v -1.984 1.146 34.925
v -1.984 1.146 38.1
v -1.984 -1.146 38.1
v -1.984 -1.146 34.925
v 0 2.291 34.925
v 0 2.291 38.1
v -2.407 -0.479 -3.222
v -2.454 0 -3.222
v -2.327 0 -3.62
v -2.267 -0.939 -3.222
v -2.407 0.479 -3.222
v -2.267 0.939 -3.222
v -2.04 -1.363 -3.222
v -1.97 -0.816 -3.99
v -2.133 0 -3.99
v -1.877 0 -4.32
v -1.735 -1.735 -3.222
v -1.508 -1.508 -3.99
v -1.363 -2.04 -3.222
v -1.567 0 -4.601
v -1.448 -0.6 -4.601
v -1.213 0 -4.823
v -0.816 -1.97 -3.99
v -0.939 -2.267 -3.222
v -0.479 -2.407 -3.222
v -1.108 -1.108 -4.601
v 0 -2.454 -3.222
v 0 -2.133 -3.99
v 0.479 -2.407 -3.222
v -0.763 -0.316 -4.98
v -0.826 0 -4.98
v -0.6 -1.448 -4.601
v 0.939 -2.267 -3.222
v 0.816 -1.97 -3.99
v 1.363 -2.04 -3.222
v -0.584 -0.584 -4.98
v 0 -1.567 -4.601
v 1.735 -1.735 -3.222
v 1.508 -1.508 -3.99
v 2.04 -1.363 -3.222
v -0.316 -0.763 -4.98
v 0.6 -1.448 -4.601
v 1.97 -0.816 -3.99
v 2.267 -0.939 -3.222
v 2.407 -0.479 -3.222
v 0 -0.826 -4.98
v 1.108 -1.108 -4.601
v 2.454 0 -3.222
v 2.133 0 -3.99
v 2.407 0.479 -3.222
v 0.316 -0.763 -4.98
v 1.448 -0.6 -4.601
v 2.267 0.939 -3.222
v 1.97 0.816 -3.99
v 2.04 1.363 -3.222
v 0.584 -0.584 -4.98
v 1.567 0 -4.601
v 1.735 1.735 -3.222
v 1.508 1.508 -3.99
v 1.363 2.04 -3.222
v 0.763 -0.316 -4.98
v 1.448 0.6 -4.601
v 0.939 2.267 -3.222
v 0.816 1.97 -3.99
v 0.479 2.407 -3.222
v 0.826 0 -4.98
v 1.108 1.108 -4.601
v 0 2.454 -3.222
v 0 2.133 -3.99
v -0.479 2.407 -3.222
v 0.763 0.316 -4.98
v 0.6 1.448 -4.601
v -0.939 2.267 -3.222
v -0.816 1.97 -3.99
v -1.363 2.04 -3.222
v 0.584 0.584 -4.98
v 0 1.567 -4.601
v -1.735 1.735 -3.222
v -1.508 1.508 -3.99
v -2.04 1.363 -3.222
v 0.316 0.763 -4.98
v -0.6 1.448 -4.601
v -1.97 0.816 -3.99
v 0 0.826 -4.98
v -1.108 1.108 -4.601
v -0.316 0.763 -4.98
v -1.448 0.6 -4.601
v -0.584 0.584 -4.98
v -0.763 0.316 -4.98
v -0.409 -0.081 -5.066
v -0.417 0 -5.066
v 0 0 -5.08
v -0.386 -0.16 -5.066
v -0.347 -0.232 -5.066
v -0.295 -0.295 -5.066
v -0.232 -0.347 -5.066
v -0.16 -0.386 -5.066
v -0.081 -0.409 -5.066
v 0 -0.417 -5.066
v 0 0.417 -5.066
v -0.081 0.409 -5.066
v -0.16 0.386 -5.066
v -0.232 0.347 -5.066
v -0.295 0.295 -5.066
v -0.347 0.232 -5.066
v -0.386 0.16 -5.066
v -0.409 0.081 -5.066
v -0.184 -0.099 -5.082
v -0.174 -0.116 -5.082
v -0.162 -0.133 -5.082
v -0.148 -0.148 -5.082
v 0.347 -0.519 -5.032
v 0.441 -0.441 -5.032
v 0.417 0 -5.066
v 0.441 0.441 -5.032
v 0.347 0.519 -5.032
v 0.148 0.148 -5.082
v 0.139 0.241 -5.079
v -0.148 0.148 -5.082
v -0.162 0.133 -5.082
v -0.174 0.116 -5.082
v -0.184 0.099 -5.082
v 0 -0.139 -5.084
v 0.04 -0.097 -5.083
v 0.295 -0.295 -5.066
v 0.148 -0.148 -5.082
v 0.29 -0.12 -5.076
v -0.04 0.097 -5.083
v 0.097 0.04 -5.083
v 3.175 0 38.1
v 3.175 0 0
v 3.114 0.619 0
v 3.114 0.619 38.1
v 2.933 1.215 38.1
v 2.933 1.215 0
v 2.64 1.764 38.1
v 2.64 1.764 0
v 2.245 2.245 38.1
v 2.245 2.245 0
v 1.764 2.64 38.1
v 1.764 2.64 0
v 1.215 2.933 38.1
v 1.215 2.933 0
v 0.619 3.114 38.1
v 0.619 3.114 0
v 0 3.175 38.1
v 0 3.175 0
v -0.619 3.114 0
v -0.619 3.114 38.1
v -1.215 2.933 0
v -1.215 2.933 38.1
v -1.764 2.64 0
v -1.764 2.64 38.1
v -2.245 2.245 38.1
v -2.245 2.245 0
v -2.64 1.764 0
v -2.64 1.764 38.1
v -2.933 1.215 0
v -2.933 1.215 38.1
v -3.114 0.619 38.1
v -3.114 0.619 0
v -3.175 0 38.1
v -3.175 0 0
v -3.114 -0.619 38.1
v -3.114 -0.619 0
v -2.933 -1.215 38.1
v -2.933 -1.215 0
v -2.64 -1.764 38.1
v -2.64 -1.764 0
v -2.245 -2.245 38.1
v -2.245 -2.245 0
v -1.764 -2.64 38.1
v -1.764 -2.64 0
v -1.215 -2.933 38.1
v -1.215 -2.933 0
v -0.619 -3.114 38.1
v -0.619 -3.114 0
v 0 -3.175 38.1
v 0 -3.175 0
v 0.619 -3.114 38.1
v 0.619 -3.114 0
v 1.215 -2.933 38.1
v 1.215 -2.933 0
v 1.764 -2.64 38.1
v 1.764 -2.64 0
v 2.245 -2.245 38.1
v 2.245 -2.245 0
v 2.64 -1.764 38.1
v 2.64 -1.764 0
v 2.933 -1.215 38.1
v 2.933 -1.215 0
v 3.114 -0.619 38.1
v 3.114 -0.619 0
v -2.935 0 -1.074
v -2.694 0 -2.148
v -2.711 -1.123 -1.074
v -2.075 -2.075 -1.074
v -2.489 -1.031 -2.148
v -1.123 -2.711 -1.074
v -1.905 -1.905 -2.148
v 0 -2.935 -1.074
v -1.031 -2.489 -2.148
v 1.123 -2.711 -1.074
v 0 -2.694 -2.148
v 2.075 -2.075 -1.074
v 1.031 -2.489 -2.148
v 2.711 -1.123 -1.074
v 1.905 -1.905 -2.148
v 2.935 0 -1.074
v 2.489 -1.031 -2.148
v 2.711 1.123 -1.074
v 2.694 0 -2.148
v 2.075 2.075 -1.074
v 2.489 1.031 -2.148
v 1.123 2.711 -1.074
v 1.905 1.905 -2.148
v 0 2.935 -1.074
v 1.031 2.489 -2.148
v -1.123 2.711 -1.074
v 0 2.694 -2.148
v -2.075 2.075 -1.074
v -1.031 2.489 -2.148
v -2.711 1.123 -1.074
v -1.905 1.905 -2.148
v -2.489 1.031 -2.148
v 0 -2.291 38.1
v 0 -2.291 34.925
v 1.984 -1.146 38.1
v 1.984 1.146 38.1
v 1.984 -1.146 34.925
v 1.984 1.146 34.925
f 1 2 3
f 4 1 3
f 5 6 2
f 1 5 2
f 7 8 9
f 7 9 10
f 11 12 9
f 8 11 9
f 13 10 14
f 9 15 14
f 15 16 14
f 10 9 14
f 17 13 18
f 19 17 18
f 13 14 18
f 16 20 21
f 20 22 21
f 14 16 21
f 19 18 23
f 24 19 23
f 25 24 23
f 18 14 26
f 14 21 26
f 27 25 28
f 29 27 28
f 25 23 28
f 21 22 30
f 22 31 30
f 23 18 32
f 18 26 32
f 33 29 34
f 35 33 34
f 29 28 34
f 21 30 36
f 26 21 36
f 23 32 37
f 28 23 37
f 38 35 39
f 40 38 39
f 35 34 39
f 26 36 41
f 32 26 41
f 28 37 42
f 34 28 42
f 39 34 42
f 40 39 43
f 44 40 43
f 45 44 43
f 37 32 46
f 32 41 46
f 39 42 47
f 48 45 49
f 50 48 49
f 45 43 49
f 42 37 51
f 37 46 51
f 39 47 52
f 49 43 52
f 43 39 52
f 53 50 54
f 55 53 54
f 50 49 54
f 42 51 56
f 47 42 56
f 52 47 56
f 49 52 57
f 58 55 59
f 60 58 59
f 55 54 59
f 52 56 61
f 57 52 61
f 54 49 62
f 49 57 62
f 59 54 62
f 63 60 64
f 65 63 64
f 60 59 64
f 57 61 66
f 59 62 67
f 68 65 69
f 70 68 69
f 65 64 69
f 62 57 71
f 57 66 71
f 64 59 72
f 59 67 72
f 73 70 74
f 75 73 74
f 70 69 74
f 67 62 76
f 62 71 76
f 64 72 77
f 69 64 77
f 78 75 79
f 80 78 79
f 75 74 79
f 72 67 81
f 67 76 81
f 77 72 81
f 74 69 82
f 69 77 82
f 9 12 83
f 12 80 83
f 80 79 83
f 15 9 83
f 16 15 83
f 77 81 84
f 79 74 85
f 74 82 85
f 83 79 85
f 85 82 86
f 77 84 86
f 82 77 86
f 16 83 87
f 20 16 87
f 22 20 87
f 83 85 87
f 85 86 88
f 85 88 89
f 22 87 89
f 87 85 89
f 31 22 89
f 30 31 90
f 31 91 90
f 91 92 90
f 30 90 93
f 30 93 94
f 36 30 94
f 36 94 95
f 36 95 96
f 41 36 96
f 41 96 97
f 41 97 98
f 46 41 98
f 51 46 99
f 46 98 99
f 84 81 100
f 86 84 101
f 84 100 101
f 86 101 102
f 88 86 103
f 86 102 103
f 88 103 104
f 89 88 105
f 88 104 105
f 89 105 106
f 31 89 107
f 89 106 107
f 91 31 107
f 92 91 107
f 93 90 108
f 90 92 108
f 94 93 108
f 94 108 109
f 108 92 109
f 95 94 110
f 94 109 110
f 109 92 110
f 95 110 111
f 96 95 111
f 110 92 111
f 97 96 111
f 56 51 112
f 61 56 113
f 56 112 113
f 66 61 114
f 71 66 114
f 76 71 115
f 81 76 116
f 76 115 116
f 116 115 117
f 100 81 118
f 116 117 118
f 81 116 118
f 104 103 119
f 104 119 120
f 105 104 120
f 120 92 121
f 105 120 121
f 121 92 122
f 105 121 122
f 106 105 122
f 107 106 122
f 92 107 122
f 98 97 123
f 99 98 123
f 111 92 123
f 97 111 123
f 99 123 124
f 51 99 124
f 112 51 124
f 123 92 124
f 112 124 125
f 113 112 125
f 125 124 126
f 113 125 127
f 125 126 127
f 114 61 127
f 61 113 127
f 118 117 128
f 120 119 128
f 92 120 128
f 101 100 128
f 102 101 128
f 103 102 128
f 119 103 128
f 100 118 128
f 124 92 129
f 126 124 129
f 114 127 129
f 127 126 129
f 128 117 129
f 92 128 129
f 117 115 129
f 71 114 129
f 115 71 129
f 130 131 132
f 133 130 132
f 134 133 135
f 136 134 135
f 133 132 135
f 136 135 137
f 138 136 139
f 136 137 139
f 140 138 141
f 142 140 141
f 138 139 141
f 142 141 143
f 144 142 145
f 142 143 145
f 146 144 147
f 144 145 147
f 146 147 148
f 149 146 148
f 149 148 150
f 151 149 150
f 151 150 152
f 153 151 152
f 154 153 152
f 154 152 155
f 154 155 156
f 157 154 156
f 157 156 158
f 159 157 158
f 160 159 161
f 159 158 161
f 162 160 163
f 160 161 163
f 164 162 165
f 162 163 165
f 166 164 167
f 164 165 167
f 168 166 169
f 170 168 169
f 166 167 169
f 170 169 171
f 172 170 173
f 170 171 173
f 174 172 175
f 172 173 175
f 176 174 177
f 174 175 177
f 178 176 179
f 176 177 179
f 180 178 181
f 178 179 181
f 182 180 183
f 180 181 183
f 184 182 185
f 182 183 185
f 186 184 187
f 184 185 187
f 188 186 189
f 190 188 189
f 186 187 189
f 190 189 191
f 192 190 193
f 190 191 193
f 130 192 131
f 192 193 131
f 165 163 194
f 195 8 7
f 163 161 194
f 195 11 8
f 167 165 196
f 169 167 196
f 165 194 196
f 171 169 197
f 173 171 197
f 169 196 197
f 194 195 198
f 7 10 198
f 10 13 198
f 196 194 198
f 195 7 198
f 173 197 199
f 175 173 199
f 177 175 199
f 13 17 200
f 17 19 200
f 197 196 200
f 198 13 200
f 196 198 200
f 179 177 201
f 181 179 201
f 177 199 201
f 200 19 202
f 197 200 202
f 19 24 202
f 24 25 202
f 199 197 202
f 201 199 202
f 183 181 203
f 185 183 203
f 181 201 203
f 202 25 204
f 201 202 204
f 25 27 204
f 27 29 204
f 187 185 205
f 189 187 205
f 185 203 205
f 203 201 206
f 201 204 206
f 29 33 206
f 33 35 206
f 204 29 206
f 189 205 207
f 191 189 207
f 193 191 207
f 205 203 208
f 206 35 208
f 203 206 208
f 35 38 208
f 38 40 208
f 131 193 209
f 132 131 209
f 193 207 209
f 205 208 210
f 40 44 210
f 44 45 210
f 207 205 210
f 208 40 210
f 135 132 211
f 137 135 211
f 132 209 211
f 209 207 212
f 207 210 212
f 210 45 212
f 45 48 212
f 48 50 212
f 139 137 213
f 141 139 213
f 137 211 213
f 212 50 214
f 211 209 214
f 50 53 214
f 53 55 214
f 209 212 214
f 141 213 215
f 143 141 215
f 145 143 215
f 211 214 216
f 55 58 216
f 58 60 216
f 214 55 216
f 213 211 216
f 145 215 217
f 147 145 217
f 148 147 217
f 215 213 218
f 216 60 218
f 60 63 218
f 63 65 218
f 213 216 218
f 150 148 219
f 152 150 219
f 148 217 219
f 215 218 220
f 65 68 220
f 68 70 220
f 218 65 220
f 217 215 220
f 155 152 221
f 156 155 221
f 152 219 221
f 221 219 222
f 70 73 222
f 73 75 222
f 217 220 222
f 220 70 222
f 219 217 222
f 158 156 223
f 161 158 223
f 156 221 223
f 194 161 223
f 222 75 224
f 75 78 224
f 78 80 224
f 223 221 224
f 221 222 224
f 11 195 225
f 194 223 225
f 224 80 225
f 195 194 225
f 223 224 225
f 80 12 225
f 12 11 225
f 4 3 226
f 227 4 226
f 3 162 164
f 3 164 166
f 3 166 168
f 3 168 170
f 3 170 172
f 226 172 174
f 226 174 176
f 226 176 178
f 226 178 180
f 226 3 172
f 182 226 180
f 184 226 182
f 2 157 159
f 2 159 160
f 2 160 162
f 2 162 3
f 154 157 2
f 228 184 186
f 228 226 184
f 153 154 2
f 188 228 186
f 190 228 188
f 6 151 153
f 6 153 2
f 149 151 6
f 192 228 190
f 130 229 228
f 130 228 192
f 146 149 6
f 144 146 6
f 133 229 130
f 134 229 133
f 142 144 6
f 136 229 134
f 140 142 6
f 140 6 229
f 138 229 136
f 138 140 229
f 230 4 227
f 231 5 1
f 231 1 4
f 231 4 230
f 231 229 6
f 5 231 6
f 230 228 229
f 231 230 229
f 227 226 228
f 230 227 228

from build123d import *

# Parameters (mm, degrees)
SKETCH1_R           = 3.175
BOSS_EXTRUDE1_DEPTH = 38.1
CUT_EXTRUDE1_DEPTH  = 3.175


with BuildPart() as part:
    # Sketch1 → Boss-Extrude1 (new body)
    with BuildSketch(Plane.XY):
        Circle(SKETCH1_R)
    extrude(amount=BOSS_EXTRUDE1_DEPTH)

    # Sketch2 → Cut-Extrude1 (cut)
    with BuildSketch(Plane.XY.offset(38.1)):
        Polygon((0, 2.291358881), (-1.984375, 1.14567944), (-1.984375, -1.14567944), (0, -2.291358881), (1.984375, -1.14567944), (1.984375, 1.14567944), align=None)
    extrude(amount=-CUT_EXTRUDE1_DEPTH, mode=Mode.SUBTRACT)

    # Sketch3 → Revolve1 (revolve)
    with BuildSketch(Plane(origin=(0, 0, 0), x_dir=(1, 0, 0), z_dir=(0, 1, 0))):
        with BuildLine():
            Line((-3.175, 0), (-2.453715979, 3.222429819))
            ThreePointArc((-2.453715979, 3.222429819), (-1.567259814, 4.600861122), (0, 5.08))
            Line((0, 5.08), (0, 0))
            Line((0, 0), (-3.175, 0))
        make_face()
    revolve(axis=Axis((0, 0, -5.08), (0, 0, 1)))


solid = part.part
